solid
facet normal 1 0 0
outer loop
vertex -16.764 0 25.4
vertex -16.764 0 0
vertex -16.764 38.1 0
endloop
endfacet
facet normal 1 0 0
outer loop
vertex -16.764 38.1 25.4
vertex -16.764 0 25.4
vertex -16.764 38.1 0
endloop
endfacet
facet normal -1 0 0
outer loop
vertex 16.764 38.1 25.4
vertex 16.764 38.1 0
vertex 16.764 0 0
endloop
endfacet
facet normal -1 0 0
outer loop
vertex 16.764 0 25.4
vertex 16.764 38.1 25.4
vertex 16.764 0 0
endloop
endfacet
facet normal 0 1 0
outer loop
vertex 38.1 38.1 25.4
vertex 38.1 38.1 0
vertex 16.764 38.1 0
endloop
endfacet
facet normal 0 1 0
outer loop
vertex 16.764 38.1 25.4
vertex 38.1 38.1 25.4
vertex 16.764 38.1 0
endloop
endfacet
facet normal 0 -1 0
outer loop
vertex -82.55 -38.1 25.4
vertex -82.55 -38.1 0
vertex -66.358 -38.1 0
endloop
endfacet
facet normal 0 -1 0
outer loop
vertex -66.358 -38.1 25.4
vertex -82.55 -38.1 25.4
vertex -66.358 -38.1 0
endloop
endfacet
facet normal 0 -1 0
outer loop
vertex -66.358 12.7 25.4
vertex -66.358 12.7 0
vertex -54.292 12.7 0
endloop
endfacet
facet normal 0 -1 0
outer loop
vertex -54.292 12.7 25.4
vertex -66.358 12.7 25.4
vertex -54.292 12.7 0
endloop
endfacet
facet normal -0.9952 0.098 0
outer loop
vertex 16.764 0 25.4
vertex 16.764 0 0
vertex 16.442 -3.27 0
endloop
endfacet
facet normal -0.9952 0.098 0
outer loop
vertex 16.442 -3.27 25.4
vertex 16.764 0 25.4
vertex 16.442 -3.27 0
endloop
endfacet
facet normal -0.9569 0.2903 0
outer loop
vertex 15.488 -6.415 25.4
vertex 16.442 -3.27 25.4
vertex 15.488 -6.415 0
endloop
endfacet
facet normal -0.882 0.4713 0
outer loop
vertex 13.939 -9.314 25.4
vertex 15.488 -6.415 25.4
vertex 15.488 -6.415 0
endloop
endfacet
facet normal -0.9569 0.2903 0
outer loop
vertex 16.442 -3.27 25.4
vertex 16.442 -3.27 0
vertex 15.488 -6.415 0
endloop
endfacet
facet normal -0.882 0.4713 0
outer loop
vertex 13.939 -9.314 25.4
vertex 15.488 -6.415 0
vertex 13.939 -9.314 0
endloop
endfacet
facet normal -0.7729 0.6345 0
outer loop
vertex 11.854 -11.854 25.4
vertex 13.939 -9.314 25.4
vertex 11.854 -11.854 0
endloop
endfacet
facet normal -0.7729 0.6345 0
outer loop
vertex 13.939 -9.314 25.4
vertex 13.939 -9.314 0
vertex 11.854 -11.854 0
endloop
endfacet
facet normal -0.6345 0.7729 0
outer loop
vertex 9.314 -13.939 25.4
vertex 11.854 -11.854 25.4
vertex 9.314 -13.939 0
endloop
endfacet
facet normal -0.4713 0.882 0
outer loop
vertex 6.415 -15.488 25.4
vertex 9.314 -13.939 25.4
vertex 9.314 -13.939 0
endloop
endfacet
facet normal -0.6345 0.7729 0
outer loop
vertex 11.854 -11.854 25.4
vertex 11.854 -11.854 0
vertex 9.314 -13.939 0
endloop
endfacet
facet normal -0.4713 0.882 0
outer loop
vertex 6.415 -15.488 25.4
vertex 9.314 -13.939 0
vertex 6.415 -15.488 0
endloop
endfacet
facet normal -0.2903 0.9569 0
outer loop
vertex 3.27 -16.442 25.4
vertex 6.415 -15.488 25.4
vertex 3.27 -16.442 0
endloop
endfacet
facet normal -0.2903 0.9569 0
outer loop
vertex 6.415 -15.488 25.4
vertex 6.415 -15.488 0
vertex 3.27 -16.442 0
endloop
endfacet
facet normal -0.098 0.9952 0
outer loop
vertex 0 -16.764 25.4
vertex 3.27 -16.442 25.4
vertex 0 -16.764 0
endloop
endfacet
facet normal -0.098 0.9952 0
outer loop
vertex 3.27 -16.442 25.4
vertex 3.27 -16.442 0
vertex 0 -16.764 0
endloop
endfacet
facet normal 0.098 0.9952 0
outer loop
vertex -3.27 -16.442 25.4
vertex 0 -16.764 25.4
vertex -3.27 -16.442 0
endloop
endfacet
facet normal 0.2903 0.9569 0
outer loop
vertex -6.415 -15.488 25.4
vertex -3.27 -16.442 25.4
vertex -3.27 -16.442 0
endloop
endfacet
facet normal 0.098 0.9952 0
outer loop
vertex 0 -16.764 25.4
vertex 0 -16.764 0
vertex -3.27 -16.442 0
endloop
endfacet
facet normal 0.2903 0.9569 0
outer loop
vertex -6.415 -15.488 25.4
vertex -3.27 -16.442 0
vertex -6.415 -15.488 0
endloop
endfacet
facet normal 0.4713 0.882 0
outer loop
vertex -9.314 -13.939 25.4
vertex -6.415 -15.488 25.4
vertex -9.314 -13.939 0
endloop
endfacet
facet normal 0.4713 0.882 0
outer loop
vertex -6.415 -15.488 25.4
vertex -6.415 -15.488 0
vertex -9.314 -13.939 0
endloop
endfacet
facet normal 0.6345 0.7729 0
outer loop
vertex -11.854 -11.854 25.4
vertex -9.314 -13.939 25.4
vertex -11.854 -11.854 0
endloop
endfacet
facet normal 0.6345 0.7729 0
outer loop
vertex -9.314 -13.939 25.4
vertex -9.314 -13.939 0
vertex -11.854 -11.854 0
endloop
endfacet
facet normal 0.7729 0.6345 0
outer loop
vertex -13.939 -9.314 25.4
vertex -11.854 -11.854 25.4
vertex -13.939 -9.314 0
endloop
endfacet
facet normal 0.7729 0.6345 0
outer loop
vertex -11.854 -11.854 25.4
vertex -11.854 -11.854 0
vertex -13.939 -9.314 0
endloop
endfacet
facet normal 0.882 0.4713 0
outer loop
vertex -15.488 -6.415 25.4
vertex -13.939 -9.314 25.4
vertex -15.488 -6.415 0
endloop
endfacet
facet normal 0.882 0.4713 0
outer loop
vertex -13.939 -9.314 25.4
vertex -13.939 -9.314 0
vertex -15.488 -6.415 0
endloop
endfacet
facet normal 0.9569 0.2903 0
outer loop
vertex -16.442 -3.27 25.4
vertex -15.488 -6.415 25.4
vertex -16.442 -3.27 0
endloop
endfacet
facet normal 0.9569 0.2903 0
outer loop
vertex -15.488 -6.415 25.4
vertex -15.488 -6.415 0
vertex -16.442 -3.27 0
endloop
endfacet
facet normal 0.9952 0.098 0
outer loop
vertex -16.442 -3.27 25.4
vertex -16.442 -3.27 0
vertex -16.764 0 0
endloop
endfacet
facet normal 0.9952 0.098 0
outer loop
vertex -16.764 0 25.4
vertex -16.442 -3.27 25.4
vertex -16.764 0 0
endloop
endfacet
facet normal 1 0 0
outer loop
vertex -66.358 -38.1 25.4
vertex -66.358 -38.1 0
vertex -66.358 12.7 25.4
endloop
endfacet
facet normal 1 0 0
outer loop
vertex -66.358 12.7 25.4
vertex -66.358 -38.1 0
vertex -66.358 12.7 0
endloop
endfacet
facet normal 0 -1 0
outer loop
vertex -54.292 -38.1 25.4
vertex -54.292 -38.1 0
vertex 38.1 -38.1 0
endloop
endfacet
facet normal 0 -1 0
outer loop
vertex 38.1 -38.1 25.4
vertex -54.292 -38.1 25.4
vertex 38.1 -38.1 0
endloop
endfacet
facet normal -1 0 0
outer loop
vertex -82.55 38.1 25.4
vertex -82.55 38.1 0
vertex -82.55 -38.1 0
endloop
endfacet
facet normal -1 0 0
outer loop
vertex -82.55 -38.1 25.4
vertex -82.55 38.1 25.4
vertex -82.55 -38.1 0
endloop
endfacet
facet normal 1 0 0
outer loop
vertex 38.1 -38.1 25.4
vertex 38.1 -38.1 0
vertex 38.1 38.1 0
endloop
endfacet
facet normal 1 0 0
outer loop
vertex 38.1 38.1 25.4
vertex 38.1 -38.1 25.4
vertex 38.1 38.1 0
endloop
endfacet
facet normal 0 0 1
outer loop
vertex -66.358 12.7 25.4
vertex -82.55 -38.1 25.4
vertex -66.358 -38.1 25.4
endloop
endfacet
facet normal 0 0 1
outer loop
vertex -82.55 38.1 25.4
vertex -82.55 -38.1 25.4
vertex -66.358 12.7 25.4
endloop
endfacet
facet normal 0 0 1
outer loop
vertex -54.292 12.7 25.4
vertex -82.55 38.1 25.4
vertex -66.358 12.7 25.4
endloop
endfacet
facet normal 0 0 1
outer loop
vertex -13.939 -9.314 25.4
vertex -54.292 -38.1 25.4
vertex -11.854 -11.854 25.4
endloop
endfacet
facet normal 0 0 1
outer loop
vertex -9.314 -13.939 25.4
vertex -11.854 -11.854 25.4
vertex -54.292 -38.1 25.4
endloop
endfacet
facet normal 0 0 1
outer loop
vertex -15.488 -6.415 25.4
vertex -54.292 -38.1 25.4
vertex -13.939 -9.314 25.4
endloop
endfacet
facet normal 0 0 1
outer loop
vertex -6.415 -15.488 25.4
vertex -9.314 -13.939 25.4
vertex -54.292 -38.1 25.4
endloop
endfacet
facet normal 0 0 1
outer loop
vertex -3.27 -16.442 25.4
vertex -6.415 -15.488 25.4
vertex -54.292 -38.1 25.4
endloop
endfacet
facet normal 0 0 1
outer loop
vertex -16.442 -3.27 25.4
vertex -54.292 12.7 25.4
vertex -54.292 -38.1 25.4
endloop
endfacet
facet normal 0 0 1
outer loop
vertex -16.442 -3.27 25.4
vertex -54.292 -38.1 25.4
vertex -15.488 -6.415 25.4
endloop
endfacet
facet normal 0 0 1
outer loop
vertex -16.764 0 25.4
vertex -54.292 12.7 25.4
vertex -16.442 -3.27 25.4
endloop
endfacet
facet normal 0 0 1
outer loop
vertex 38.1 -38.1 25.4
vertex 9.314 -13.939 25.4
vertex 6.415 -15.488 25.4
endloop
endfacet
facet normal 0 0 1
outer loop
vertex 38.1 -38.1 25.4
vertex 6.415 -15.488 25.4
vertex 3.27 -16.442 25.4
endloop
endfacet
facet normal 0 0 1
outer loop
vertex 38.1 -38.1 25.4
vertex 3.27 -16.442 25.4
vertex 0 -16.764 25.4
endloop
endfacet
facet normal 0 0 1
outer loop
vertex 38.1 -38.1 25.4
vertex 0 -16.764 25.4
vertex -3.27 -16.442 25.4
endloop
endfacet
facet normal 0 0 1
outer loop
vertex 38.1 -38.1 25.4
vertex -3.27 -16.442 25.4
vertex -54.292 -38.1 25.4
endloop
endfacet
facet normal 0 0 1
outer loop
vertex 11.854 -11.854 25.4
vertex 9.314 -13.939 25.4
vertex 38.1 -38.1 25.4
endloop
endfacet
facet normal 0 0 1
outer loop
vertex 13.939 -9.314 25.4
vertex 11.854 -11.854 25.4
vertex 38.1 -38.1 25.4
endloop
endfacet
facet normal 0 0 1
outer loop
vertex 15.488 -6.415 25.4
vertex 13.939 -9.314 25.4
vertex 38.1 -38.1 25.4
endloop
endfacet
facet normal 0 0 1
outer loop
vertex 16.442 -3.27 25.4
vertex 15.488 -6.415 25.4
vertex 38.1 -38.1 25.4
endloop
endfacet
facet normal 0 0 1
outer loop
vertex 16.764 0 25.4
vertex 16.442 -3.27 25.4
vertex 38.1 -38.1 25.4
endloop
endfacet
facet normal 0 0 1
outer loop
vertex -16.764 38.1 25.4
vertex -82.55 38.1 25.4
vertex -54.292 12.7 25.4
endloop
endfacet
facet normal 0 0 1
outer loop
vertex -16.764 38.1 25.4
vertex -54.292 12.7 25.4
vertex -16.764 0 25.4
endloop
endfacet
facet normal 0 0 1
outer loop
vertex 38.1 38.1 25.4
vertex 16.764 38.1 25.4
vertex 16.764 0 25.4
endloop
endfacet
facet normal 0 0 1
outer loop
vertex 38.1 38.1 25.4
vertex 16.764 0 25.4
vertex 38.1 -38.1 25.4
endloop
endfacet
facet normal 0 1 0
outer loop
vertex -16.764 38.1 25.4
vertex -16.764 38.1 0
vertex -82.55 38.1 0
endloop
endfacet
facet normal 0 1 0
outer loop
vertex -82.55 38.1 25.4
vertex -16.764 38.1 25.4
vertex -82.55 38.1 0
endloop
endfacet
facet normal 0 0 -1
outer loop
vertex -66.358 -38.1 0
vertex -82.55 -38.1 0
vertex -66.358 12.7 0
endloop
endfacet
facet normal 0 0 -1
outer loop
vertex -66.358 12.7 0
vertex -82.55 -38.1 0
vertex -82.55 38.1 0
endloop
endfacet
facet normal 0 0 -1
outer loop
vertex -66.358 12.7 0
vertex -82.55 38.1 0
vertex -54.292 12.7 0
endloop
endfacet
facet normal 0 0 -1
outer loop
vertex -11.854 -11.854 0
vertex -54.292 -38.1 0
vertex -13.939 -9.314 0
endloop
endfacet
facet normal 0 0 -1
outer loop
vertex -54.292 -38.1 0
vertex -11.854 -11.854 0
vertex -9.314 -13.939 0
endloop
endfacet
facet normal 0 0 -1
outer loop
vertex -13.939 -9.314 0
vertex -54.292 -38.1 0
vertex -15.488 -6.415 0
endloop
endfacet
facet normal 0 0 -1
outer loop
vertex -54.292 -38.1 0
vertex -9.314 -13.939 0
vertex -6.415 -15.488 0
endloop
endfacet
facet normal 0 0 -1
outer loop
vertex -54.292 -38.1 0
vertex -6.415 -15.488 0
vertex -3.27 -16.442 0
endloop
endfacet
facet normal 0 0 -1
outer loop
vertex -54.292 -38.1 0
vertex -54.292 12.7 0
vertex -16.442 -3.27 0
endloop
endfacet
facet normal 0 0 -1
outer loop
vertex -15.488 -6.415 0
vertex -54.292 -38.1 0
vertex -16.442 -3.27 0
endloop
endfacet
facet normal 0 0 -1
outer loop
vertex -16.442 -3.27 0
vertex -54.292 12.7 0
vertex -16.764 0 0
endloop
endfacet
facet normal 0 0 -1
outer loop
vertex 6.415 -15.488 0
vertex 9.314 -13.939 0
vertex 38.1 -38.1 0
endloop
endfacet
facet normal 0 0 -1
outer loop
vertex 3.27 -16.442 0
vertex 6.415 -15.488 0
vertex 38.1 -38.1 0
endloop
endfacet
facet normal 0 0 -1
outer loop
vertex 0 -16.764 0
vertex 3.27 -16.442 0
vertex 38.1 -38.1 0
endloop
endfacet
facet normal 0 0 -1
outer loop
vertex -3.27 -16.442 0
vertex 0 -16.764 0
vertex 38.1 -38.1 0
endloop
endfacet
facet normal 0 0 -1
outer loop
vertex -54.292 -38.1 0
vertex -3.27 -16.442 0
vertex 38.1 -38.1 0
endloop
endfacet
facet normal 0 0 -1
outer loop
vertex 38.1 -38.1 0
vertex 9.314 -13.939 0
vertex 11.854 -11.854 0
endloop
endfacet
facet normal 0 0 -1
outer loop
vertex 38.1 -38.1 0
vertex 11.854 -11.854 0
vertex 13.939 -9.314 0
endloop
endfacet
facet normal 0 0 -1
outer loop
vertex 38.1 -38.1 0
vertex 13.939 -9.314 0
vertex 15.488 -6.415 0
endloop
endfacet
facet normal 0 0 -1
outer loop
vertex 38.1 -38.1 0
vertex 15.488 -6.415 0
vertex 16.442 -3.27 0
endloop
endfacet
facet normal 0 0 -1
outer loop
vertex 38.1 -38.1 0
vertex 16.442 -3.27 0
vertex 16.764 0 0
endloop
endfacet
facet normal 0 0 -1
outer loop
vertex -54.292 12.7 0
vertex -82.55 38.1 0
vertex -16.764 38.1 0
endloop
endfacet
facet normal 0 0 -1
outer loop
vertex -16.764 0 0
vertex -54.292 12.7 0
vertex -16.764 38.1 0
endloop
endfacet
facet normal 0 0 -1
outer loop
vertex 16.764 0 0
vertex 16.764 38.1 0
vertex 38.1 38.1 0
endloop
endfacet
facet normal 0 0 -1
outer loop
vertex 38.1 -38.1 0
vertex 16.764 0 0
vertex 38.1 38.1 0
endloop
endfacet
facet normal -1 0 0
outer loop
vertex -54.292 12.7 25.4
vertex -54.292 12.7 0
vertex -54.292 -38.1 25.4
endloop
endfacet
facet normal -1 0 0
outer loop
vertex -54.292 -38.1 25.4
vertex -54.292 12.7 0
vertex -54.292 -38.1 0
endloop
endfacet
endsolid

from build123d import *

# Parameters (mm, degrees)
F1_DEPTH = 25.4


with BuildPart() as f1:
    # F0 (on Top) → F1 (new body)
    with BuildSketch(Plane.XY):
        with BuildLine():
            Line((38.1, -38.1), (38.1, 38.1))
            Line((38.1, 38.1), (16.764, 38.1))
            Line((16.764, 38.1), (16.764, 0))
            ThreePointArc((16.764, 0), (0, -16.764), (-16.764, 0))
            Line((-16.764, 0), (-16.764, 38.1))
            Line((-16.764, 38.1), (-38.1, 38.1))
            Line((-38.1, 38.1), (-38.1, -38.1))
            Line((-38.1, -38.1), (38.1, -38.1))
        make_face()
        Polygon((-54.2925, -38.1), (-38.1, -38.1), (-38.1, 38.1), (-82.55, 38.1), (-82.55, -38.1), (-66.3575, -38.1), (-66.3575, 12.7), (-60.325, 12.7), (-54.2925, 12.7), align=None)
    extrude(amount=F1_DEPTH)


solid = f1.part
